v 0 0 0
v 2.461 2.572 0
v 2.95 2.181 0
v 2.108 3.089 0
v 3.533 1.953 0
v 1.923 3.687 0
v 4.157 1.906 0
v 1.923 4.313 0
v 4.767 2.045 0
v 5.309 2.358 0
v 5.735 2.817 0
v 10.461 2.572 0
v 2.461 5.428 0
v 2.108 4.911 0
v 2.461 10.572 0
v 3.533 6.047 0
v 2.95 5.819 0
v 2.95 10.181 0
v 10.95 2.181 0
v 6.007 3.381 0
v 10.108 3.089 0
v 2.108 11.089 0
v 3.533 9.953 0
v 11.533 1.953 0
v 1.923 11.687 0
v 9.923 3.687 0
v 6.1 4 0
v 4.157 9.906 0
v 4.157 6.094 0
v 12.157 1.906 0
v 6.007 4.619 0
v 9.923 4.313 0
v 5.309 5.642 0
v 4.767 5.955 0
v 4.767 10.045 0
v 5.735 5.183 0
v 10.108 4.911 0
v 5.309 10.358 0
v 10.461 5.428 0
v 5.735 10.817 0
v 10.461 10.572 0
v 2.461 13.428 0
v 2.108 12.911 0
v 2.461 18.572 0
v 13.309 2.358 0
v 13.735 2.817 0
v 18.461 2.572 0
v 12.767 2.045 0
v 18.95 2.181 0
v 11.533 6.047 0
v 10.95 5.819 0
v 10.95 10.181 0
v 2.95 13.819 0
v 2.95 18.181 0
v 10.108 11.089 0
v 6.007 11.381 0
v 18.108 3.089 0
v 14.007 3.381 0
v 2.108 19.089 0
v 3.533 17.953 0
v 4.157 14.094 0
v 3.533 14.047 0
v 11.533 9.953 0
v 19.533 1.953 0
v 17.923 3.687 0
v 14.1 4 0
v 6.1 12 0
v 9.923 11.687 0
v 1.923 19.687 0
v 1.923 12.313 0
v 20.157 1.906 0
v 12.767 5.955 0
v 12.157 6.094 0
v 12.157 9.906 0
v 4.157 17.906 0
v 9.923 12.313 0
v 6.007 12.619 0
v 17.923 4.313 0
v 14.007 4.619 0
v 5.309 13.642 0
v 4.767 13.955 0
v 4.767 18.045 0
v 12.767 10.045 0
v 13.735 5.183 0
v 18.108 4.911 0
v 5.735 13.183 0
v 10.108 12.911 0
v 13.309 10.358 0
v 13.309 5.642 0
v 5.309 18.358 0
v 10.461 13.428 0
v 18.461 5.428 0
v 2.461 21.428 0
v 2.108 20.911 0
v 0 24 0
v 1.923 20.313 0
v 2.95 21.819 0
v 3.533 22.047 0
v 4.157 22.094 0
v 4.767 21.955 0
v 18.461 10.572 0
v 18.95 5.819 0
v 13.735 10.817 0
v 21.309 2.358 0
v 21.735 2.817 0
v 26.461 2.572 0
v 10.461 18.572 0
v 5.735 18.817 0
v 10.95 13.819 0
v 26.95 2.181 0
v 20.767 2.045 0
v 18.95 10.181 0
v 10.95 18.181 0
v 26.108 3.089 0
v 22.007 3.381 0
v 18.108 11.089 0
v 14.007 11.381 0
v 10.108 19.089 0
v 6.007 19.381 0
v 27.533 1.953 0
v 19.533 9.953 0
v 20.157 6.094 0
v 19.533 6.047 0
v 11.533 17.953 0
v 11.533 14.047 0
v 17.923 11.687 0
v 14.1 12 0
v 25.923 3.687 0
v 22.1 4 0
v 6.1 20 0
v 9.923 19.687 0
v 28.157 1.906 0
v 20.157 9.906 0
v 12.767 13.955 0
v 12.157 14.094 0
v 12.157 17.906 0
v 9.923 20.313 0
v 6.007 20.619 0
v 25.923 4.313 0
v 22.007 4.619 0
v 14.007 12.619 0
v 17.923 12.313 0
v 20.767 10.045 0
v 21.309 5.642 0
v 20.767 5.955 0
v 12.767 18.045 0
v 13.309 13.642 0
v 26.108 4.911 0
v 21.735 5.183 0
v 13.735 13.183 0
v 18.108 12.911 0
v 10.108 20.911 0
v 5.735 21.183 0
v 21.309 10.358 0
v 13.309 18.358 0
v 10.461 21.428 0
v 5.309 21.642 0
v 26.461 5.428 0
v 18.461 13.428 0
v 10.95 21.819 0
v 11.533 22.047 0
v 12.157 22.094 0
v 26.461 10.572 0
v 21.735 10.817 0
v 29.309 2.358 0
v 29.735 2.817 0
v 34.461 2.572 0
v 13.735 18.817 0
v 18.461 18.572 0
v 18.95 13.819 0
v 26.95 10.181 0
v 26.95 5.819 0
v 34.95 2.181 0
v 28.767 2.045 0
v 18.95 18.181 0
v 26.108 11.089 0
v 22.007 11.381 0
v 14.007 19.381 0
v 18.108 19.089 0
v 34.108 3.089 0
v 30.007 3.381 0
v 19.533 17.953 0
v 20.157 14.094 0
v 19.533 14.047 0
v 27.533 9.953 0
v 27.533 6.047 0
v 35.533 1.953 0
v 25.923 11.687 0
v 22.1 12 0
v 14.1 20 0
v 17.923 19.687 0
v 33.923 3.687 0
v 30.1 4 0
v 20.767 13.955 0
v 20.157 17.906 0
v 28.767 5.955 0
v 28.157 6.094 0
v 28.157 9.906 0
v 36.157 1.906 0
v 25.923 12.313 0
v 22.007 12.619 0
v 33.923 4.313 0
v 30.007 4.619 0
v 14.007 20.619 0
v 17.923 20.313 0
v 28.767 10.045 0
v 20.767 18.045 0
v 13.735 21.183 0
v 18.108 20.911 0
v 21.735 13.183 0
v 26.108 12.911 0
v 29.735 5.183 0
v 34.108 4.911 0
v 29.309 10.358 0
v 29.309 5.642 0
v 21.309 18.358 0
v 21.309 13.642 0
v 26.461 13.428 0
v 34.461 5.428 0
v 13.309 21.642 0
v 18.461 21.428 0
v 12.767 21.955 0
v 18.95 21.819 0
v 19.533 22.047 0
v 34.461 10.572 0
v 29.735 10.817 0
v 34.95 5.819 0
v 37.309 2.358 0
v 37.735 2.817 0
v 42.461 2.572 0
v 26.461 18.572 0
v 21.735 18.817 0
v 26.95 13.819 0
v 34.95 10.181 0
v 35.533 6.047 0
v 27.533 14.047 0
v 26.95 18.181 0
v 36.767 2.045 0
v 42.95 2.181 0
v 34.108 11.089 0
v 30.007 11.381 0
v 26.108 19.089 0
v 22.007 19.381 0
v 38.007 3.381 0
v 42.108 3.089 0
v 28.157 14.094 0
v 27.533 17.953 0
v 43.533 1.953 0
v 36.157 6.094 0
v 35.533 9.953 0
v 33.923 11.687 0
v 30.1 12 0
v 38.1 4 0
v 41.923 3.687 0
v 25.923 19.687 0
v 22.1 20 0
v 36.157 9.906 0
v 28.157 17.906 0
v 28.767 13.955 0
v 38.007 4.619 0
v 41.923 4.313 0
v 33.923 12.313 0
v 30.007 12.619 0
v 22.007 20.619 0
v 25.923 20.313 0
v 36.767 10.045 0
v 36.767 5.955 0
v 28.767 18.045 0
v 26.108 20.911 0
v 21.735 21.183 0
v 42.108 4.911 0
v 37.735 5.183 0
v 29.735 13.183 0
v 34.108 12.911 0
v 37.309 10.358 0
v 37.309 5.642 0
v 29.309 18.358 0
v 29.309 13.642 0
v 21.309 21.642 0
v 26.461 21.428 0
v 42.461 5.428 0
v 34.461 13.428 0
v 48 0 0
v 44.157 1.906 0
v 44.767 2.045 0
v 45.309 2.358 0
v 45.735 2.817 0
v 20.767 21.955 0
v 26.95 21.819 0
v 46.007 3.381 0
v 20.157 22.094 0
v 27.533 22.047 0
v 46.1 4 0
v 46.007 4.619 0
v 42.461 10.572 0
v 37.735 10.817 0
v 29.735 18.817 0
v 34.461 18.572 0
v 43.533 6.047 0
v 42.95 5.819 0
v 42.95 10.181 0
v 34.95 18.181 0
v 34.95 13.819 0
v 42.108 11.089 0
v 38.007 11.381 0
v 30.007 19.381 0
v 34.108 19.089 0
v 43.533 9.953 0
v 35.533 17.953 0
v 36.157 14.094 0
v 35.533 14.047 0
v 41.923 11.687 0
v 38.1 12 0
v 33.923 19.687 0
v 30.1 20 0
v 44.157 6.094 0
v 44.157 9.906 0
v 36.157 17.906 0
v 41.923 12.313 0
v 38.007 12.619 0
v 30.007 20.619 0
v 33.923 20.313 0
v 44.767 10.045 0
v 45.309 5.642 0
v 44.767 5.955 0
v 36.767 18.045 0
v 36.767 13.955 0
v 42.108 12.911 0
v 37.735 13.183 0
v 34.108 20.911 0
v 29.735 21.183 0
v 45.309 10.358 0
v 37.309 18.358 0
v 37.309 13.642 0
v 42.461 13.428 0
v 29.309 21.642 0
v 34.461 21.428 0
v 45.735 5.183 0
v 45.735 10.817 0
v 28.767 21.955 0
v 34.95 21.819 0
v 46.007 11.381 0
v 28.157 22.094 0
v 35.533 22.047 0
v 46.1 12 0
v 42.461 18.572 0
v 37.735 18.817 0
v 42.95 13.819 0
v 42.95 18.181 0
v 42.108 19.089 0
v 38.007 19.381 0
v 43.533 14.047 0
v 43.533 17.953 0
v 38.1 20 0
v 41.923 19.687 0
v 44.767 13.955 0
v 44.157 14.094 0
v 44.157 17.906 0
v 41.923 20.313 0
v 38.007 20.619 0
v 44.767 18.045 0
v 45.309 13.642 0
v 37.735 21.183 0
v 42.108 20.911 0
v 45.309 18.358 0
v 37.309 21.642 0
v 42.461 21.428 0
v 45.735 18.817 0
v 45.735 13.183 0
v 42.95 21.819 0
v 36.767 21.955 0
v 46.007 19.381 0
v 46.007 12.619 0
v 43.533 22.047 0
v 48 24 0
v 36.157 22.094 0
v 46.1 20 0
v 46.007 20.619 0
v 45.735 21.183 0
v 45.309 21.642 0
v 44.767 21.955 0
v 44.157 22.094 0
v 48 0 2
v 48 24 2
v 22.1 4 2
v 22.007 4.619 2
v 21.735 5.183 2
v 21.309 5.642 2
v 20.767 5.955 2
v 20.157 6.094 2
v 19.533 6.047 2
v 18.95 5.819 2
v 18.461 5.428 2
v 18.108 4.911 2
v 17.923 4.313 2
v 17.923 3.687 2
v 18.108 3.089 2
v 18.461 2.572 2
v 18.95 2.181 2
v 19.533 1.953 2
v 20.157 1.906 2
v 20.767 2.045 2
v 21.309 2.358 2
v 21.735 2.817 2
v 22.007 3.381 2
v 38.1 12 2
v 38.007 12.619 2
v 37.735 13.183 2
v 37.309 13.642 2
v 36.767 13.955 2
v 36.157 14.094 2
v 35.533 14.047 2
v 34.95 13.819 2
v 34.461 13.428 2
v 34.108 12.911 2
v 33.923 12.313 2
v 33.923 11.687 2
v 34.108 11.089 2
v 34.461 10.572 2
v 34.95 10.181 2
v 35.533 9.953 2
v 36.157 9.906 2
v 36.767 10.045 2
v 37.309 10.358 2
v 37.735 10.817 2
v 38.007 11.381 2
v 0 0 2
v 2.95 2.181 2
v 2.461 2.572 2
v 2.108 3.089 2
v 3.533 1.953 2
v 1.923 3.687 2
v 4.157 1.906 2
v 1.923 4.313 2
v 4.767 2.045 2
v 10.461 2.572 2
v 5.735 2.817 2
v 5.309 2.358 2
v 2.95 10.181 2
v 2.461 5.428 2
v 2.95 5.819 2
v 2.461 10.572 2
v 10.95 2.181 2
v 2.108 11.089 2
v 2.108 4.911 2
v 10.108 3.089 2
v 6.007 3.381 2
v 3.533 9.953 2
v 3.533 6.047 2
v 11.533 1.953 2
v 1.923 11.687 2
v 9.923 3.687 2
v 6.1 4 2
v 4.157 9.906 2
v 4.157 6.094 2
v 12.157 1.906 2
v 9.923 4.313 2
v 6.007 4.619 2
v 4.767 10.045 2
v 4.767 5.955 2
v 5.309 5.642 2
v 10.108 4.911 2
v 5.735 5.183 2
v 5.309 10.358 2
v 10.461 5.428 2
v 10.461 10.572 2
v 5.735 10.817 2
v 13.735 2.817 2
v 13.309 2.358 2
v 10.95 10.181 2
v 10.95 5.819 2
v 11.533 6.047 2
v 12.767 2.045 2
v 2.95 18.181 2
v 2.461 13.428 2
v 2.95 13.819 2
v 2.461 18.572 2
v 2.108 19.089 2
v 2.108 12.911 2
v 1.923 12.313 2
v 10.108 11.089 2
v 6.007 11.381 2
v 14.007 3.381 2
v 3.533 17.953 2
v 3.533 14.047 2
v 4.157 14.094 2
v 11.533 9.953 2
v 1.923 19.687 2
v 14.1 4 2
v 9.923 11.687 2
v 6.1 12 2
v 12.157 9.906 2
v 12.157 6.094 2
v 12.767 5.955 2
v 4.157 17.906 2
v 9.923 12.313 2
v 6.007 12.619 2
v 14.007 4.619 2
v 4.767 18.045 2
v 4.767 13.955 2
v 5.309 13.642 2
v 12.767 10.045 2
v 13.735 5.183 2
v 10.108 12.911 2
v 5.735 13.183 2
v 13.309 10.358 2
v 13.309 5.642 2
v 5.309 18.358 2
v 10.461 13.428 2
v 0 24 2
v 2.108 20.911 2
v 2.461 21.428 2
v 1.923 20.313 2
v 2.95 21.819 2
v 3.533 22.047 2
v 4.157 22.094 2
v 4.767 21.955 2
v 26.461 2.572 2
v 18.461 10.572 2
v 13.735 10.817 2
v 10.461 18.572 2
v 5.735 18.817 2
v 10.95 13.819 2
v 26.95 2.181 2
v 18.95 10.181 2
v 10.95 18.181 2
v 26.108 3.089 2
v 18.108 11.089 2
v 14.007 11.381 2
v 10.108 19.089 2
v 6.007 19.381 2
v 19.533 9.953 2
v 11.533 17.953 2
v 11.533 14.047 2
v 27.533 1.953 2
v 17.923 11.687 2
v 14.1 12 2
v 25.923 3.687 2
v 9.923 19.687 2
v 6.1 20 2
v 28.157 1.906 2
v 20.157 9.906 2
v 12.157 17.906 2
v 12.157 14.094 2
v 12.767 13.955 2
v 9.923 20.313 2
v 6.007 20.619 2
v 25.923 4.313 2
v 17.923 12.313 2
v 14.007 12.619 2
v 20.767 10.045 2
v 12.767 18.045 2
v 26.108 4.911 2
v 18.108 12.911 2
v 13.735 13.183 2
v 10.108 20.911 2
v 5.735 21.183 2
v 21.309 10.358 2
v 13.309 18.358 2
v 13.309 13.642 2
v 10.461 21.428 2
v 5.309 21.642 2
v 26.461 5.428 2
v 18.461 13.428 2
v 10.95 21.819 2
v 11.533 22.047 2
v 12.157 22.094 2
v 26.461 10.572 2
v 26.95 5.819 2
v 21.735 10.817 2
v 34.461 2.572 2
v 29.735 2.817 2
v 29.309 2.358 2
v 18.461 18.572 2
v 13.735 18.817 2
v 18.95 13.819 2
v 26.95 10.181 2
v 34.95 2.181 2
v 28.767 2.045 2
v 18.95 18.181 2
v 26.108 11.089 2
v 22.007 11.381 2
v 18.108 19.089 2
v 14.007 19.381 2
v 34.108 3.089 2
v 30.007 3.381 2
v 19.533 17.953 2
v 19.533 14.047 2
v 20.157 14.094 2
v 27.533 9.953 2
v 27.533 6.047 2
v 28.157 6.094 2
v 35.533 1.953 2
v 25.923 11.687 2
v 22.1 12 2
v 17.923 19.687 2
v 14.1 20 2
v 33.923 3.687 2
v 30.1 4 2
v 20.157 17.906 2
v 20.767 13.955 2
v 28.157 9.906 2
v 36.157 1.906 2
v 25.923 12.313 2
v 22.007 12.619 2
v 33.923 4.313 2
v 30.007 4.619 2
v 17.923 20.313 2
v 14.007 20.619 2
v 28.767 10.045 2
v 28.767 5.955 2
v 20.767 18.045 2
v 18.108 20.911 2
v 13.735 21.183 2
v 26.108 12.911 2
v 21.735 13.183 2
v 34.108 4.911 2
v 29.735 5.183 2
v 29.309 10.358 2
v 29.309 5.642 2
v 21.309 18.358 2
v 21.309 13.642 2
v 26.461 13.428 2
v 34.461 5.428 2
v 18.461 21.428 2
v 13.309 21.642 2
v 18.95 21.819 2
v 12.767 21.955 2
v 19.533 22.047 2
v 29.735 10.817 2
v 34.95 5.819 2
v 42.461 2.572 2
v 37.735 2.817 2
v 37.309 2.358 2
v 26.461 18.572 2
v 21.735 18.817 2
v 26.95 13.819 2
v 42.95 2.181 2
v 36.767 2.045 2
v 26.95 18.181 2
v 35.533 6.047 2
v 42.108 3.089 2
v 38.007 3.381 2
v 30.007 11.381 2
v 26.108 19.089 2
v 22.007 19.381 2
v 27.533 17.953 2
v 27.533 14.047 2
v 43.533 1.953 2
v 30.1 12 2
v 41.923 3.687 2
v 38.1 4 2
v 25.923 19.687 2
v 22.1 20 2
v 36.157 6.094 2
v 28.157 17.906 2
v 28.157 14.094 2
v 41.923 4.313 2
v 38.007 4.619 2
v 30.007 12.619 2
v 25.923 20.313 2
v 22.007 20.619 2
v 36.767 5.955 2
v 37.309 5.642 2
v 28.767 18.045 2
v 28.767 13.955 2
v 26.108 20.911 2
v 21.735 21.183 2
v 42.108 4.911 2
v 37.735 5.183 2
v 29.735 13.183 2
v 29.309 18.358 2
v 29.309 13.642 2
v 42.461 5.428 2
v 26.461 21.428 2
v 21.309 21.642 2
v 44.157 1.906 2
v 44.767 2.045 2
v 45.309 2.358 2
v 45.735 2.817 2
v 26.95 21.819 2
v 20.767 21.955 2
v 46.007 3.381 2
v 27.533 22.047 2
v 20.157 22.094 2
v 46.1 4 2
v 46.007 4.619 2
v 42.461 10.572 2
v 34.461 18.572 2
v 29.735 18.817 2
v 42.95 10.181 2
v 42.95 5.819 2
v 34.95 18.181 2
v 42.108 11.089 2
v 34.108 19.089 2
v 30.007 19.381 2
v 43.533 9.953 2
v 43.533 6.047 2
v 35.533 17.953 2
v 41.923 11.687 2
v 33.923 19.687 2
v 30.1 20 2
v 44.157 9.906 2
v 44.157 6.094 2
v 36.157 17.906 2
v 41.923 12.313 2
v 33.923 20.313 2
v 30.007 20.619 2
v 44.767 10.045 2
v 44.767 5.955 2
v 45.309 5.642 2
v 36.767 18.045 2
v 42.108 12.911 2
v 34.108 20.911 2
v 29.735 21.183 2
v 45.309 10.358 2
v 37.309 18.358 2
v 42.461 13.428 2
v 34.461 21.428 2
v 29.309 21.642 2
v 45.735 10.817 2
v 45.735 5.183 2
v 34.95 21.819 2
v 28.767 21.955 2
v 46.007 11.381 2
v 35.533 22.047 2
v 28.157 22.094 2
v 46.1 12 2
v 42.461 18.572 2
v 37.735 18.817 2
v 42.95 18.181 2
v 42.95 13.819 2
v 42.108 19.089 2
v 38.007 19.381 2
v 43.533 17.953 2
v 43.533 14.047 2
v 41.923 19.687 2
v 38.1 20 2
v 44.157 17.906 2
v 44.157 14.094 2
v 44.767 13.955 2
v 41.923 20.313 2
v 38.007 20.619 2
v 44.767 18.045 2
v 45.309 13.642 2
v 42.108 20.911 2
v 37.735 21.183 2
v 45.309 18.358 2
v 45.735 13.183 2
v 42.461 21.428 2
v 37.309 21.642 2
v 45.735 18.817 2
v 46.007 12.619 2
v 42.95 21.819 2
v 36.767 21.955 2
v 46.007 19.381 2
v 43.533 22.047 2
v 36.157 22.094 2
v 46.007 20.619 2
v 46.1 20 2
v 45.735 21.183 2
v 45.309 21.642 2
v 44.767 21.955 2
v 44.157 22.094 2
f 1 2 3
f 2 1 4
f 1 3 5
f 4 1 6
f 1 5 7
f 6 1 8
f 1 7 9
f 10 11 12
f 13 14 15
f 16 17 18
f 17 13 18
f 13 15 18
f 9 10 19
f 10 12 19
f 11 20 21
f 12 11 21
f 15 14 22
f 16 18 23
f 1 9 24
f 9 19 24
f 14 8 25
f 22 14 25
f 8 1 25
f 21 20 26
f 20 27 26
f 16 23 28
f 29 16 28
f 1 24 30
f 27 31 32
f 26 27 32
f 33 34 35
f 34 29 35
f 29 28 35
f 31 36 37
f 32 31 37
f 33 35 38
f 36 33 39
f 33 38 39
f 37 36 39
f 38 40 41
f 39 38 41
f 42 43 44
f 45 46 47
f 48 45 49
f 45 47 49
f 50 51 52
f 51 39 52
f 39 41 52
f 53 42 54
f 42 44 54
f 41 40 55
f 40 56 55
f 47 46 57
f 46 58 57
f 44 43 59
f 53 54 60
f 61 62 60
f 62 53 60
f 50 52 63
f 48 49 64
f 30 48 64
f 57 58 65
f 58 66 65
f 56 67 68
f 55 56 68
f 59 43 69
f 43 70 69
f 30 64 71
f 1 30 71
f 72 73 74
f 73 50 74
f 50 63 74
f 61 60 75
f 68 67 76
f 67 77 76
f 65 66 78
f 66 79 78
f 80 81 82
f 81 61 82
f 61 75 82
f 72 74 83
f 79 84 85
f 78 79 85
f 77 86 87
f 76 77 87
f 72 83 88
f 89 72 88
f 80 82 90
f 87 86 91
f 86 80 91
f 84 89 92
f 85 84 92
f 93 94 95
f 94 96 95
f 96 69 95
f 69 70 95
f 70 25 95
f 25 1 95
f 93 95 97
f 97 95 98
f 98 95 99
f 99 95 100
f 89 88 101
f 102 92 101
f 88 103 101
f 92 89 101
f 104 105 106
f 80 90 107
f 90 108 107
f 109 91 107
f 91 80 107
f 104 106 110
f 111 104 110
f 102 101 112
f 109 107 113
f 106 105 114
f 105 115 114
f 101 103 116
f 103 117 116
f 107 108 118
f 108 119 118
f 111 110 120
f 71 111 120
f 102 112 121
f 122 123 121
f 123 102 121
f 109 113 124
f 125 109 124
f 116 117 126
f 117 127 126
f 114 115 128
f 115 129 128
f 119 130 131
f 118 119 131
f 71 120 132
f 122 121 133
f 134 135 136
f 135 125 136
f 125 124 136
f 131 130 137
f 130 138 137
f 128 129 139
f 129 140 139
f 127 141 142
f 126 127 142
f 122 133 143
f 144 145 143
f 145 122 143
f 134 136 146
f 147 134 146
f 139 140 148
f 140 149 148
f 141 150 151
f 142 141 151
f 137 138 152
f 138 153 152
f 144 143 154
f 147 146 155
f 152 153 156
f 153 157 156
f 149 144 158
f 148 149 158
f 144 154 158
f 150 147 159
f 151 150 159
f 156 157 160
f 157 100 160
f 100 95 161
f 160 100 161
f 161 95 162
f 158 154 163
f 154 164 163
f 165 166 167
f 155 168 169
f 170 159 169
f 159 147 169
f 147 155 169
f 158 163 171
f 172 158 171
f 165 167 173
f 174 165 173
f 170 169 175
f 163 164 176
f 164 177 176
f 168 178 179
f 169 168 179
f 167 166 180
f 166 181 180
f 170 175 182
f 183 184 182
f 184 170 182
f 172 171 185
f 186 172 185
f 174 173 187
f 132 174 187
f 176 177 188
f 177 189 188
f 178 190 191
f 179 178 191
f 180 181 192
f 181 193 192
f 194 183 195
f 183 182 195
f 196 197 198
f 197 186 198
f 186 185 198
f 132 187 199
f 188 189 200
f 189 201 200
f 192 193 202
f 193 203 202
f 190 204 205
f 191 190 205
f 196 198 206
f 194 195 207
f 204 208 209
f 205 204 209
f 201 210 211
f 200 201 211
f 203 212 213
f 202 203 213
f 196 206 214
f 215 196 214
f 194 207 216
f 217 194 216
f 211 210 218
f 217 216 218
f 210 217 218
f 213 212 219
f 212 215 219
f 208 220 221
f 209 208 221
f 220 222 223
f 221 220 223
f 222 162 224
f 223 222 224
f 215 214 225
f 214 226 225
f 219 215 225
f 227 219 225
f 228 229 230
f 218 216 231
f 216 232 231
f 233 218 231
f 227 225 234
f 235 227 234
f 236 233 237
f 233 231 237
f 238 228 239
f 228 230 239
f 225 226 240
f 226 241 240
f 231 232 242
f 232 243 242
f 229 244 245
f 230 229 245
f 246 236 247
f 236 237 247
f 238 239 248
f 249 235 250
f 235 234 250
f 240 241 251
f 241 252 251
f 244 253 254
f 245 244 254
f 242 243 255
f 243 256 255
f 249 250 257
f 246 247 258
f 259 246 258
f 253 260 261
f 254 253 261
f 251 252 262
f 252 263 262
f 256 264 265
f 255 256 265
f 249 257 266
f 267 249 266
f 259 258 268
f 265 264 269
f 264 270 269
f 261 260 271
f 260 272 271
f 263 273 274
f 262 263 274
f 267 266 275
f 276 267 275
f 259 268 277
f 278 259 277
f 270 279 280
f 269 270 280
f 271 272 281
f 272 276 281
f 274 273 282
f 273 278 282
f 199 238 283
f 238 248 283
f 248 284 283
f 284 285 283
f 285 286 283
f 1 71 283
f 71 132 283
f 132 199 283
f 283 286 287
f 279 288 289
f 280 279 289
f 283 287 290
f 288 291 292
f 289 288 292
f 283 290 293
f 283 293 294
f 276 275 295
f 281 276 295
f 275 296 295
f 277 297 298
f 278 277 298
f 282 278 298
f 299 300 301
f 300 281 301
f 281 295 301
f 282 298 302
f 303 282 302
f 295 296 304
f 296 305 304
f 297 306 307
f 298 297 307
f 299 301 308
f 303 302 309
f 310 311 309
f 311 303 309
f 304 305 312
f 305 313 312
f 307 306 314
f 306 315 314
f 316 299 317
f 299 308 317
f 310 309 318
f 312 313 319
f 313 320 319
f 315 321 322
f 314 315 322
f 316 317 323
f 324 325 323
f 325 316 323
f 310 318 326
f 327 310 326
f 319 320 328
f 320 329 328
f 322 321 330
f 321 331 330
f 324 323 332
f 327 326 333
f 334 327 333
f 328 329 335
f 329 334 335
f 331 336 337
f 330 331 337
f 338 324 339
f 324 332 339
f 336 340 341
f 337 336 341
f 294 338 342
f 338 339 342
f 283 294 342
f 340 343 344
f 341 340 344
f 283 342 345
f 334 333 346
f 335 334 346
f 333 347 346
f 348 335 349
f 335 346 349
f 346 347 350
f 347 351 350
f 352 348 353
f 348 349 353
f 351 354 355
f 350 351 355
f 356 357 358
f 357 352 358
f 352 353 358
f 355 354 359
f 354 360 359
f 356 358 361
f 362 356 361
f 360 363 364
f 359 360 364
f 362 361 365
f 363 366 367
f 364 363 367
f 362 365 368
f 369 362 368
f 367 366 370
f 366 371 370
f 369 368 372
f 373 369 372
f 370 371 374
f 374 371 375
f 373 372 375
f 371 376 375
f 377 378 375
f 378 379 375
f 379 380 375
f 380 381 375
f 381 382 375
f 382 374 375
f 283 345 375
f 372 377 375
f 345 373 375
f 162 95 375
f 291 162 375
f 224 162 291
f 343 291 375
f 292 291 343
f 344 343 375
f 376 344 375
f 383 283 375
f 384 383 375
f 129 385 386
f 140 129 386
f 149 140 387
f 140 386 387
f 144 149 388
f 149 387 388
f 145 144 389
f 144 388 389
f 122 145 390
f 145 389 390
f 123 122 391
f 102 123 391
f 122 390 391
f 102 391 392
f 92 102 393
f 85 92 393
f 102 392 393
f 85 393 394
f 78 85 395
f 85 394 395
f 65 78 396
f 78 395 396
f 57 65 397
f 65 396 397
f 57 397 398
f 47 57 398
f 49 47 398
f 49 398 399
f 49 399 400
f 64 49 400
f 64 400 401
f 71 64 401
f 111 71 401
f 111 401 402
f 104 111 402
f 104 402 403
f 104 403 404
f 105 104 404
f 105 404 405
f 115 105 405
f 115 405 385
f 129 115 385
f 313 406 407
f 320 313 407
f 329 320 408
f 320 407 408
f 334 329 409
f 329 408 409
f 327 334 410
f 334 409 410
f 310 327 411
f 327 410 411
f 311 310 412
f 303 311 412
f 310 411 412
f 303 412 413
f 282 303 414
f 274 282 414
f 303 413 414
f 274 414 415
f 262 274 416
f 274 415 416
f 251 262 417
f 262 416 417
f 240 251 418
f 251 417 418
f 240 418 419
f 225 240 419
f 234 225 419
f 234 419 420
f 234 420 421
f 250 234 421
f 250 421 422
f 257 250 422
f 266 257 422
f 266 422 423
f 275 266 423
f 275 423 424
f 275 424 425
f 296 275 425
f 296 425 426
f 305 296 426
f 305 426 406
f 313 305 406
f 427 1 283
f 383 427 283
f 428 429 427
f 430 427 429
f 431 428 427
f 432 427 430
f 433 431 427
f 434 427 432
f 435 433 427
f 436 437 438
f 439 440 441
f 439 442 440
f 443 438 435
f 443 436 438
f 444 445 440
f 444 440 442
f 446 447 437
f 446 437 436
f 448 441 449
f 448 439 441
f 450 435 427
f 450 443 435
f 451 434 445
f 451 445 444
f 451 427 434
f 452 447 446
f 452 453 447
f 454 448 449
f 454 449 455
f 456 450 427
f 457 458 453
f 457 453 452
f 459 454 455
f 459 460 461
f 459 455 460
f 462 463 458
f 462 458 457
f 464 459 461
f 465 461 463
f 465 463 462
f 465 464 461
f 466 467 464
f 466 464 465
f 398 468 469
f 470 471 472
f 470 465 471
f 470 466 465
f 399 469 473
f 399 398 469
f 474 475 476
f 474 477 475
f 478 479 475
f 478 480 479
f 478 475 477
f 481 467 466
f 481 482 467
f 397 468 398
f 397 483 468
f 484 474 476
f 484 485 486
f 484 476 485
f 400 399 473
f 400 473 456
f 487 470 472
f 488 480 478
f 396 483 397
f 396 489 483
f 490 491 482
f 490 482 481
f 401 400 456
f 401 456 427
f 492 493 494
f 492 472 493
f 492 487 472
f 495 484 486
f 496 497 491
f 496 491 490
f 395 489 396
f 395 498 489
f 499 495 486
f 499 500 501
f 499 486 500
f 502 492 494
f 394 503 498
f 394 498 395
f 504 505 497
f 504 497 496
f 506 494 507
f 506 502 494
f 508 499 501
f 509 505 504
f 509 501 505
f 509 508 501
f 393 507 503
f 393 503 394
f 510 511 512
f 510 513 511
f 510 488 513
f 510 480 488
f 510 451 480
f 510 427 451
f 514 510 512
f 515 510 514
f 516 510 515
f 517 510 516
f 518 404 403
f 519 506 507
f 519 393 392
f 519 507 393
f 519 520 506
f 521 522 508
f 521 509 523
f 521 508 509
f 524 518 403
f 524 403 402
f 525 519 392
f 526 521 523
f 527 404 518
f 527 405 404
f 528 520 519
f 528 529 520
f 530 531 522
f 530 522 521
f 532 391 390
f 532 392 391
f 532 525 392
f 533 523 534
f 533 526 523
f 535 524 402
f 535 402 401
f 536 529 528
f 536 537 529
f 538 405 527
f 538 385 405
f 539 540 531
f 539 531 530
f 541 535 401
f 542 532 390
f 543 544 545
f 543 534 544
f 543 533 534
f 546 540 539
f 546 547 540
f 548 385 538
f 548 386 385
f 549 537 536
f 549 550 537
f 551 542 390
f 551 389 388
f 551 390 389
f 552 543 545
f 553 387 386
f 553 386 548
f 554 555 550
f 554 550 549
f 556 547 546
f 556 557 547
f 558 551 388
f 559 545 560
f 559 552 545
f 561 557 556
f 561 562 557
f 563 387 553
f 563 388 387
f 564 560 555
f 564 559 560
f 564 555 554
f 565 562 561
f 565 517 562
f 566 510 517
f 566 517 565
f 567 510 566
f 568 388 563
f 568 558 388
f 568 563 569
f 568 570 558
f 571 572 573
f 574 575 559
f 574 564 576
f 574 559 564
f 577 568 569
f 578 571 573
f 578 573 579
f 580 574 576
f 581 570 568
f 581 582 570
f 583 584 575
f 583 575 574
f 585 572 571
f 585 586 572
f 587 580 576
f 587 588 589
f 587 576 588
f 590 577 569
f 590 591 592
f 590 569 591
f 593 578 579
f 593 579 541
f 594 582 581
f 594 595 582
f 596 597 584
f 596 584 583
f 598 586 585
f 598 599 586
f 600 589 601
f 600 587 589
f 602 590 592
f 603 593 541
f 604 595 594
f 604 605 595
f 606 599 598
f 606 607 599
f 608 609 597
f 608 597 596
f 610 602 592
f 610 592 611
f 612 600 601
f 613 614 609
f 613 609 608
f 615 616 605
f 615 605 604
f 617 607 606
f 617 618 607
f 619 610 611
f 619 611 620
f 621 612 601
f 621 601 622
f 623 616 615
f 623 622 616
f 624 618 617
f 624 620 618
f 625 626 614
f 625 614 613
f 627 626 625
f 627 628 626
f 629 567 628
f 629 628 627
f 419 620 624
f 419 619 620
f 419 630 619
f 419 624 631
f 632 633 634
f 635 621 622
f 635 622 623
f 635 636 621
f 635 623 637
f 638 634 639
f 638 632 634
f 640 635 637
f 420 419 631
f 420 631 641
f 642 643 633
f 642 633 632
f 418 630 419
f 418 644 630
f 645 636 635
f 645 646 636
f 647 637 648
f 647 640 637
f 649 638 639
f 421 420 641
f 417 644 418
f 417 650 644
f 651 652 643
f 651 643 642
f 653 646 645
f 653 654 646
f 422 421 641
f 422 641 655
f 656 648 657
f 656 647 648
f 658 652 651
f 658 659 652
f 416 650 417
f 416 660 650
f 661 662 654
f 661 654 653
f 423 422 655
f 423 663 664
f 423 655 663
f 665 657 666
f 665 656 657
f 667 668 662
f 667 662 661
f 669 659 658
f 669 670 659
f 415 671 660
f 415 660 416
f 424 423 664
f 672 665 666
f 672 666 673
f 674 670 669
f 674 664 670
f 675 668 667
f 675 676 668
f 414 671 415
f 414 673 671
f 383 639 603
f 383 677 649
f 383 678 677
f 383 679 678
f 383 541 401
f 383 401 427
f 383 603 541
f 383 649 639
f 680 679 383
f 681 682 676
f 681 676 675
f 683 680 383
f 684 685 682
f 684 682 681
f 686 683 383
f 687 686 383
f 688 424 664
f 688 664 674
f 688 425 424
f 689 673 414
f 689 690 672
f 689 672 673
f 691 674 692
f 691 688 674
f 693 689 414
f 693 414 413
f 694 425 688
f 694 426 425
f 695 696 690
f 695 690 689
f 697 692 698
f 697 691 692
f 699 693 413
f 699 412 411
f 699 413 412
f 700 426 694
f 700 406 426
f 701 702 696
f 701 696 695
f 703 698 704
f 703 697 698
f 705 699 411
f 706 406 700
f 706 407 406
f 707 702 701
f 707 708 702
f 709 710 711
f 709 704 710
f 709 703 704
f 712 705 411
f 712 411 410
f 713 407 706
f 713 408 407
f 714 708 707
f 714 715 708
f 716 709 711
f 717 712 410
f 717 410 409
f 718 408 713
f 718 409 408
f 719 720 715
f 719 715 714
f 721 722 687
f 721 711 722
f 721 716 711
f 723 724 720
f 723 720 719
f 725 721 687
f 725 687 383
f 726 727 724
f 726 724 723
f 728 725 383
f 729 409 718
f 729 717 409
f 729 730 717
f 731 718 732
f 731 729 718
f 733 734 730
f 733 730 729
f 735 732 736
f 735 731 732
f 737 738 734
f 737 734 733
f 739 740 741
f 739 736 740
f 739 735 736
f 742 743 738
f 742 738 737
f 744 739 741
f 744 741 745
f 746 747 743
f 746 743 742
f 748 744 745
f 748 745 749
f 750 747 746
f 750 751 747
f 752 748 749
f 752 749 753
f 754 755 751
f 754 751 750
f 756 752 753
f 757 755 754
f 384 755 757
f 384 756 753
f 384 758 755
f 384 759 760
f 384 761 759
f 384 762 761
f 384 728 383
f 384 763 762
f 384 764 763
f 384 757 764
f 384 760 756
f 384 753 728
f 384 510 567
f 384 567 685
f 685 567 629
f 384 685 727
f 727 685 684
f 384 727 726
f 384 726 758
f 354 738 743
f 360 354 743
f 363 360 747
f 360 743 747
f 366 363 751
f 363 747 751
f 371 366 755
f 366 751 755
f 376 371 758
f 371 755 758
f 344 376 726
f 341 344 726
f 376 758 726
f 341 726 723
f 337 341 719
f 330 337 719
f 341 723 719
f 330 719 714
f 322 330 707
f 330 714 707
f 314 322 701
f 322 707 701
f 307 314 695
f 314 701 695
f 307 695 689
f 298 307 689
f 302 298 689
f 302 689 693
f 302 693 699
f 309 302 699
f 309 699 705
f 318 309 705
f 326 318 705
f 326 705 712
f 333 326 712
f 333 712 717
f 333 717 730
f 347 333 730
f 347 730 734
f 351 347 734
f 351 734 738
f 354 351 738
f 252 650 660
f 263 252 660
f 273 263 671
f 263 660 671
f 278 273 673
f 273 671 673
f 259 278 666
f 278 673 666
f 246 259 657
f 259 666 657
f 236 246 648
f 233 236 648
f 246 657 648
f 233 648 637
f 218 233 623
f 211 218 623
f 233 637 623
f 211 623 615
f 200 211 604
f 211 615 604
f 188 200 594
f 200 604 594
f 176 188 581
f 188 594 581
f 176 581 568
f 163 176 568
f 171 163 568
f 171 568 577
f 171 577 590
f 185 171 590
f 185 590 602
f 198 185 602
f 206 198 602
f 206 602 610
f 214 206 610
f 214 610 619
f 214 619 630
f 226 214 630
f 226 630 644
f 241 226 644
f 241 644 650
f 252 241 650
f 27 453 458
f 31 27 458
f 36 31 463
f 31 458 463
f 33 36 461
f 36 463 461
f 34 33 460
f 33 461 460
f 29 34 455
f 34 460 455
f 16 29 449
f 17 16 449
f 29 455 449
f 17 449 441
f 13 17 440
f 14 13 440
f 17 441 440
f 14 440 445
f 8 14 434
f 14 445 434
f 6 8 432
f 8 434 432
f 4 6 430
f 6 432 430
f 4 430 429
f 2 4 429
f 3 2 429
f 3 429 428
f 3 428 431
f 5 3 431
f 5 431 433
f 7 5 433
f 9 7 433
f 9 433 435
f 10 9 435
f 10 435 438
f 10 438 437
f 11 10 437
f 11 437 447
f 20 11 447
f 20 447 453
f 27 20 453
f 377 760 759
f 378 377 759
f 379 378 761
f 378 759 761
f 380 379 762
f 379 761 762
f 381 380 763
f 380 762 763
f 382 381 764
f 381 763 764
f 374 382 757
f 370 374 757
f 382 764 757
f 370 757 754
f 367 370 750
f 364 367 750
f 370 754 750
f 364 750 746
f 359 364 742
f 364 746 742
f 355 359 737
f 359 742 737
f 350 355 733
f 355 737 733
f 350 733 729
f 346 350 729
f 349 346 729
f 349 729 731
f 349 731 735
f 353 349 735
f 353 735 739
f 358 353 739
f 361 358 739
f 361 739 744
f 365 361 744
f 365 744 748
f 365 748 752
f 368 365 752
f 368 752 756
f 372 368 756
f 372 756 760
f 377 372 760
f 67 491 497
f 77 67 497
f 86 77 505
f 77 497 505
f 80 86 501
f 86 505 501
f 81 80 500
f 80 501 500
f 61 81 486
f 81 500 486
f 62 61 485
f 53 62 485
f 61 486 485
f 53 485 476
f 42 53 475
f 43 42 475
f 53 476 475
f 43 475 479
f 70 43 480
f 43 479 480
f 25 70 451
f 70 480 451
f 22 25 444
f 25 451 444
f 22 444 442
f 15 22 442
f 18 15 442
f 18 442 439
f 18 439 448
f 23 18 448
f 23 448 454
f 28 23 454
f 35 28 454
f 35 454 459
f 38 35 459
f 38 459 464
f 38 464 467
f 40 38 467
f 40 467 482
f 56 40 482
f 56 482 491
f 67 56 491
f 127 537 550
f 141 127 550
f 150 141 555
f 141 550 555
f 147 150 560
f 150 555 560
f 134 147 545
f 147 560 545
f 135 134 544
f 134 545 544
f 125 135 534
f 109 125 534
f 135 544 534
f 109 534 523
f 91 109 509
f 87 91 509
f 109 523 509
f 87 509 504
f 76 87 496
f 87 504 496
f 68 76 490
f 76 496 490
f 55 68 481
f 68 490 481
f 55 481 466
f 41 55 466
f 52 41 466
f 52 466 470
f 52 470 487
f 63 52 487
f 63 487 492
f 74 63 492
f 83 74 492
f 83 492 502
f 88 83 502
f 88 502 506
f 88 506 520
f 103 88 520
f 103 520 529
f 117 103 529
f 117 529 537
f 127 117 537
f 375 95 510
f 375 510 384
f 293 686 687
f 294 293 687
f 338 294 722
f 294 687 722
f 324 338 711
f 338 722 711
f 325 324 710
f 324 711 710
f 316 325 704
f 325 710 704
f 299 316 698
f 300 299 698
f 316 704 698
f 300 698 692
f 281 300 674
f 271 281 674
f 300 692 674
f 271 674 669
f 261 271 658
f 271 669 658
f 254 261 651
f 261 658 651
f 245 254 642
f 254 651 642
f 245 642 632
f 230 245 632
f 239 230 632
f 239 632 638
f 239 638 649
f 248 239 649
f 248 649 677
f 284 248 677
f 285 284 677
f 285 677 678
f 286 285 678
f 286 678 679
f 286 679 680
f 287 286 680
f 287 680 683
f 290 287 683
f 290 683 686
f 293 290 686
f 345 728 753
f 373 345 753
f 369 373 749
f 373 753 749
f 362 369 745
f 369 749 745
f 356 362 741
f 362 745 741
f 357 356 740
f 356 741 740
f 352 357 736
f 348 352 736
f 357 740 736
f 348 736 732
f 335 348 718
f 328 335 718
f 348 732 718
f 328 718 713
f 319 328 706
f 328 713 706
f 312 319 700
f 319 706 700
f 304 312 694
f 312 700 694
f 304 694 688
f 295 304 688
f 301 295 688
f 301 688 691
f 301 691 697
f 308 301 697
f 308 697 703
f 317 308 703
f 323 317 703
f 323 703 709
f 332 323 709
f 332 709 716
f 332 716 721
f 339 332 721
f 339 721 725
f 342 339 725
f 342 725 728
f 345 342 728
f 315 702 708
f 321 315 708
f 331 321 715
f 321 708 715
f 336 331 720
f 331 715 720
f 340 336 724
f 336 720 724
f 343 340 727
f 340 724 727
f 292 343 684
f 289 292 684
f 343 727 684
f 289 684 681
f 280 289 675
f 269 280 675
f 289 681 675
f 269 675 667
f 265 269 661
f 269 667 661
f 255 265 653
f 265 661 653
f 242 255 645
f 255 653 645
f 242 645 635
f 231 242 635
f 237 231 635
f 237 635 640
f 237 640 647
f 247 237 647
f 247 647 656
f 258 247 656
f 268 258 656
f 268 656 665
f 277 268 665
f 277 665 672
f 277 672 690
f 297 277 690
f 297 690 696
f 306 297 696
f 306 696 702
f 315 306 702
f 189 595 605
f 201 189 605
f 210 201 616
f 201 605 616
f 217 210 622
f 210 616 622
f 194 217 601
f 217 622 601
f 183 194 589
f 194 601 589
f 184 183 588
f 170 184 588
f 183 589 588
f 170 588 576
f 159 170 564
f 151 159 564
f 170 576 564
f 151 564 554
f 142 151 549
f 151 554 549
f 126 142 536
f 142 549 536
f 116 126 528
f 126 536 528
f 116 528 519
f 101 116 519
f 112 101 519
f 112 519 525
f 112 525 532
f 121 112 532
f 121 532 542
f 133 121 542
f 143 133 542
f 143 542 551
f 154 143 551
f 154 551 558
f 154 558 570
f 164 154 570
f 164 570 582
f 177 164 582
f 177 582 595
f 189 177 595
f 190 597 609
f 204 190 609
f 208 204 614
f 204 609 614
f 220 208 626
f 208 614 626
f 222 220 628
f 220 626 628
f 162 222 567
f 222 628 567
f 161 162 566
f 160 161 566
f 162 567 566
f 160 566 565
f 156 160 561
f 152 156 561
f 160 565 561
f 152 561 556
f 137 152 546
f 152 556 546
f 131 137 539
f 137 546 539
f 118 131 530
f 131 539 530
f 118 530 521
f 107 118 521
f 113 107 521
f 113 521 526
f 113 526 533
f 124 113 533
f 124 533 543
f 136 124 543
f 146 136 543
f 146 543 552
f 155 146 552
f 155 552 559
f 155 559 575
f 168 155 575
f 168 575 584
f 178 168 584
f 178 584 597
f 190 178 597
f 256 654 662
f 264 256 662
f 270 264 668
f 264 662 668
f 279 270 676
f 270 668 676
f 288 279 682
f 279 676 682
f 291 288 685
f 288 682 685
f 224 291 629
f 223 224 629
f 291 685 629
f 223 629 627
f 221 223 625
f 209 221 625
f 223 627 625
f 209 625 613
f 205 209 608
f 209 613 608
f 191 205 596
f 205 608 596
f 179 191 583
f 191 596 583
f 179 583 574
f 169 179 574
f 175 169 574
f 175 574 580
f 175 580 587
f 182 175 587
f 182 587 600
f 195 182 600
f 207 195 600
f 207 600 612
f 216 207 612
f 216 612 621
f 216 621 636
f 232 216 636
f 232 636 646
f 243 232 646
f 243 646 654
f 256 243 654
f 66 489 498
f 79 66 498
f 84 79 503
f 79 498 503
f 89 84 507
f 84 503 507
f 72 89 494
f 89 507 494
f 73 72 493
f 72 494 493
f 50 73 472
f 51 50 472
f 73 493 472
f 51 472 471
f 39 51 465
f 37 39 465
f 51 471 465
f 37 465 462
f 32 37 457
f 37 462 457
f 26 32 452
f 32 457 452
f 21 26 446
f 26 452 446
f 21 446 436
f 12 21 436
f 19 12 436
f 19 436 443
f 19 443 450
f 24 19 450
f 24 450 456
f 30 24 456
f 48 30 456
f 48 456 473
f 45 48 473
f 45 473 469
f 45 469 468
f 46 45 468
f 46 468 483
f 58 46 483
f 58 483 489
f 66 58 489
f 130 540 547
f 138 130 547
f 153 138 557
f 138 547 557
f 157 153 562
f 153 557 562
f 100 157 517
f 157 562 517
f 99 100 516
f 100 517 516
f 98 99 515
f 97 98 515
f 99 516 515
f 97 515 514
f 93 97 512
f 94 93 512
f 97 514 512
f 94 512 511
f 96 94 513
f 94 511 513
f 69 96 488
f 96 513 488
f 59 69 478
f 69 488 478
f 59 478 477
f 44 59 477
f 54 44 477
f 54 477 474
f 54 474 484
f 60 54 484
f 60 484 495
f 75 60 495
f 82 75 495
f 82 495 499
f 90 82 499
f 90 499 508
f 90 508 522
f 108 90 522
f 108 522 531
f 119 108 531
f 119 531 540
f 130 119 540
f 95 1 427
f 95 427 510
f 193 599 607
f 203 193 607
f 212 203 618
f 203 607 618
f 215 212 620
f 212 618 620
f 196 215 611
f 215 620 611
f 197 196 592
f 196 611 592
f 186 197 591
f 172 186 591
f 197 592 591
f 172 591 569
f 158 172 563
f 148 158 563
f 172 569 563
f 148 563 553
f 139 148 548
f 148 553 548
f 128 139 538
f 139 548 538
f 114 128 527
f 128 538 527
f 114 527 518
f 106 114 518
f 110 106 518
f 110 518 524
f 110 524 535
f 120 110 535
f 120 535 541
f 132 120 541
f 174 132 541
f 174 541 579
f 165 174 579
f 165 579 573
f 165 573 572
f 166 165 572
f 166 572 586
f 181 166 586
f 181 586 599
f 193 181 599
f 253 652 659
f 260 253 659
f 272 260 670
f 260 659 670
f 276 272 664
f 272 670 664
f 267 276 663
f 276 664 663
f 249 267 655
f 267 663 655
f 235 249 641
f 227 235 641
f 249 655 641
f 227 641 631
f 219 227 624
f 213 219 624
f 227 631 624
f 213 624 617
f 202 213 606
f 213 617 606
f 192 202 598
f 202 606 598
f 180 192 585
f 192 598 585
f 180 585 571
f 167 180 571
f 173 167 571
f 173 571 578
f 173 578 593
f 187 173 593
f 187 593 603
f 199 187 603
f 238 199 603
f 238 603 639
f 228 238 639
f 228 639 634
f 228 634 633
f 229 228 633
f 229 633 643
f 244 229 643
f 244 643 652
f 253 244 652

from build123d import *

# Parameters (mm, degrees)
ESQUISSE1_W                     = 48
ESQUISSE1_H                     = 24
BOSS_EXTRU_1_DEPTH              = 2
ESQUISSE2_R                     = 2.1
ENL_V_MAT_EXTRU_1_DEPTH         = 54.702886328
R_P_TITION_LIN_AIRE1_COUNT      = 3
R_P_TITION_LIN_AIRE1_PITCH      = 8
R_P_TITION_LIN_AIRE1_COUNT_DIR2 = 6
R_P_TITION_LIN_AIRE1_PITCH_DIR2 = 8


with BuildPart() as part:
    # Esquisse1 → Boss.-Extru.1 (new body)
    with BuildSketch(Plane.XY):
        with Locations((24, 12)):
            Rectangle(ESQUISSE1_W, ESQUISSE1_H)
    extrude(amount=BOSS_EXTRU_1_DEPTH)

    # Esquisse2 → Enlèv. mat.-Extru.1 (cut, through all)
    with BuildSketch(Plane.XY.offset(2)):
        with Locations((4, 20)):
            Circle(ESQUISSE2_R)
    enl_v_mat_extru_1 = extrude(amount=-ENL_V_MAT_EXTRU_1_DEPTH, mode=Mode.SUBTRACT)

    # Répétition linéaire1: Enl_v. mat.-Extru.1 3 × 6
    with Locations(*[(j * R_P_TITION_LIN_AIRE1_PITCH_DIR2, -i * R_P_TITION_LIN_AIRE1_PITCH, 0) for i in range(R_P_TITION_LIN_AIRE1_COUNT) for j in range(R_P_TITION_LIN_AIRE1_COUNT_DIR2) if (i, j) != (0, 0)]):
        add(enl_v_mat_extru_1, mode=Mode.SUBTRACT)


solid = part.part
